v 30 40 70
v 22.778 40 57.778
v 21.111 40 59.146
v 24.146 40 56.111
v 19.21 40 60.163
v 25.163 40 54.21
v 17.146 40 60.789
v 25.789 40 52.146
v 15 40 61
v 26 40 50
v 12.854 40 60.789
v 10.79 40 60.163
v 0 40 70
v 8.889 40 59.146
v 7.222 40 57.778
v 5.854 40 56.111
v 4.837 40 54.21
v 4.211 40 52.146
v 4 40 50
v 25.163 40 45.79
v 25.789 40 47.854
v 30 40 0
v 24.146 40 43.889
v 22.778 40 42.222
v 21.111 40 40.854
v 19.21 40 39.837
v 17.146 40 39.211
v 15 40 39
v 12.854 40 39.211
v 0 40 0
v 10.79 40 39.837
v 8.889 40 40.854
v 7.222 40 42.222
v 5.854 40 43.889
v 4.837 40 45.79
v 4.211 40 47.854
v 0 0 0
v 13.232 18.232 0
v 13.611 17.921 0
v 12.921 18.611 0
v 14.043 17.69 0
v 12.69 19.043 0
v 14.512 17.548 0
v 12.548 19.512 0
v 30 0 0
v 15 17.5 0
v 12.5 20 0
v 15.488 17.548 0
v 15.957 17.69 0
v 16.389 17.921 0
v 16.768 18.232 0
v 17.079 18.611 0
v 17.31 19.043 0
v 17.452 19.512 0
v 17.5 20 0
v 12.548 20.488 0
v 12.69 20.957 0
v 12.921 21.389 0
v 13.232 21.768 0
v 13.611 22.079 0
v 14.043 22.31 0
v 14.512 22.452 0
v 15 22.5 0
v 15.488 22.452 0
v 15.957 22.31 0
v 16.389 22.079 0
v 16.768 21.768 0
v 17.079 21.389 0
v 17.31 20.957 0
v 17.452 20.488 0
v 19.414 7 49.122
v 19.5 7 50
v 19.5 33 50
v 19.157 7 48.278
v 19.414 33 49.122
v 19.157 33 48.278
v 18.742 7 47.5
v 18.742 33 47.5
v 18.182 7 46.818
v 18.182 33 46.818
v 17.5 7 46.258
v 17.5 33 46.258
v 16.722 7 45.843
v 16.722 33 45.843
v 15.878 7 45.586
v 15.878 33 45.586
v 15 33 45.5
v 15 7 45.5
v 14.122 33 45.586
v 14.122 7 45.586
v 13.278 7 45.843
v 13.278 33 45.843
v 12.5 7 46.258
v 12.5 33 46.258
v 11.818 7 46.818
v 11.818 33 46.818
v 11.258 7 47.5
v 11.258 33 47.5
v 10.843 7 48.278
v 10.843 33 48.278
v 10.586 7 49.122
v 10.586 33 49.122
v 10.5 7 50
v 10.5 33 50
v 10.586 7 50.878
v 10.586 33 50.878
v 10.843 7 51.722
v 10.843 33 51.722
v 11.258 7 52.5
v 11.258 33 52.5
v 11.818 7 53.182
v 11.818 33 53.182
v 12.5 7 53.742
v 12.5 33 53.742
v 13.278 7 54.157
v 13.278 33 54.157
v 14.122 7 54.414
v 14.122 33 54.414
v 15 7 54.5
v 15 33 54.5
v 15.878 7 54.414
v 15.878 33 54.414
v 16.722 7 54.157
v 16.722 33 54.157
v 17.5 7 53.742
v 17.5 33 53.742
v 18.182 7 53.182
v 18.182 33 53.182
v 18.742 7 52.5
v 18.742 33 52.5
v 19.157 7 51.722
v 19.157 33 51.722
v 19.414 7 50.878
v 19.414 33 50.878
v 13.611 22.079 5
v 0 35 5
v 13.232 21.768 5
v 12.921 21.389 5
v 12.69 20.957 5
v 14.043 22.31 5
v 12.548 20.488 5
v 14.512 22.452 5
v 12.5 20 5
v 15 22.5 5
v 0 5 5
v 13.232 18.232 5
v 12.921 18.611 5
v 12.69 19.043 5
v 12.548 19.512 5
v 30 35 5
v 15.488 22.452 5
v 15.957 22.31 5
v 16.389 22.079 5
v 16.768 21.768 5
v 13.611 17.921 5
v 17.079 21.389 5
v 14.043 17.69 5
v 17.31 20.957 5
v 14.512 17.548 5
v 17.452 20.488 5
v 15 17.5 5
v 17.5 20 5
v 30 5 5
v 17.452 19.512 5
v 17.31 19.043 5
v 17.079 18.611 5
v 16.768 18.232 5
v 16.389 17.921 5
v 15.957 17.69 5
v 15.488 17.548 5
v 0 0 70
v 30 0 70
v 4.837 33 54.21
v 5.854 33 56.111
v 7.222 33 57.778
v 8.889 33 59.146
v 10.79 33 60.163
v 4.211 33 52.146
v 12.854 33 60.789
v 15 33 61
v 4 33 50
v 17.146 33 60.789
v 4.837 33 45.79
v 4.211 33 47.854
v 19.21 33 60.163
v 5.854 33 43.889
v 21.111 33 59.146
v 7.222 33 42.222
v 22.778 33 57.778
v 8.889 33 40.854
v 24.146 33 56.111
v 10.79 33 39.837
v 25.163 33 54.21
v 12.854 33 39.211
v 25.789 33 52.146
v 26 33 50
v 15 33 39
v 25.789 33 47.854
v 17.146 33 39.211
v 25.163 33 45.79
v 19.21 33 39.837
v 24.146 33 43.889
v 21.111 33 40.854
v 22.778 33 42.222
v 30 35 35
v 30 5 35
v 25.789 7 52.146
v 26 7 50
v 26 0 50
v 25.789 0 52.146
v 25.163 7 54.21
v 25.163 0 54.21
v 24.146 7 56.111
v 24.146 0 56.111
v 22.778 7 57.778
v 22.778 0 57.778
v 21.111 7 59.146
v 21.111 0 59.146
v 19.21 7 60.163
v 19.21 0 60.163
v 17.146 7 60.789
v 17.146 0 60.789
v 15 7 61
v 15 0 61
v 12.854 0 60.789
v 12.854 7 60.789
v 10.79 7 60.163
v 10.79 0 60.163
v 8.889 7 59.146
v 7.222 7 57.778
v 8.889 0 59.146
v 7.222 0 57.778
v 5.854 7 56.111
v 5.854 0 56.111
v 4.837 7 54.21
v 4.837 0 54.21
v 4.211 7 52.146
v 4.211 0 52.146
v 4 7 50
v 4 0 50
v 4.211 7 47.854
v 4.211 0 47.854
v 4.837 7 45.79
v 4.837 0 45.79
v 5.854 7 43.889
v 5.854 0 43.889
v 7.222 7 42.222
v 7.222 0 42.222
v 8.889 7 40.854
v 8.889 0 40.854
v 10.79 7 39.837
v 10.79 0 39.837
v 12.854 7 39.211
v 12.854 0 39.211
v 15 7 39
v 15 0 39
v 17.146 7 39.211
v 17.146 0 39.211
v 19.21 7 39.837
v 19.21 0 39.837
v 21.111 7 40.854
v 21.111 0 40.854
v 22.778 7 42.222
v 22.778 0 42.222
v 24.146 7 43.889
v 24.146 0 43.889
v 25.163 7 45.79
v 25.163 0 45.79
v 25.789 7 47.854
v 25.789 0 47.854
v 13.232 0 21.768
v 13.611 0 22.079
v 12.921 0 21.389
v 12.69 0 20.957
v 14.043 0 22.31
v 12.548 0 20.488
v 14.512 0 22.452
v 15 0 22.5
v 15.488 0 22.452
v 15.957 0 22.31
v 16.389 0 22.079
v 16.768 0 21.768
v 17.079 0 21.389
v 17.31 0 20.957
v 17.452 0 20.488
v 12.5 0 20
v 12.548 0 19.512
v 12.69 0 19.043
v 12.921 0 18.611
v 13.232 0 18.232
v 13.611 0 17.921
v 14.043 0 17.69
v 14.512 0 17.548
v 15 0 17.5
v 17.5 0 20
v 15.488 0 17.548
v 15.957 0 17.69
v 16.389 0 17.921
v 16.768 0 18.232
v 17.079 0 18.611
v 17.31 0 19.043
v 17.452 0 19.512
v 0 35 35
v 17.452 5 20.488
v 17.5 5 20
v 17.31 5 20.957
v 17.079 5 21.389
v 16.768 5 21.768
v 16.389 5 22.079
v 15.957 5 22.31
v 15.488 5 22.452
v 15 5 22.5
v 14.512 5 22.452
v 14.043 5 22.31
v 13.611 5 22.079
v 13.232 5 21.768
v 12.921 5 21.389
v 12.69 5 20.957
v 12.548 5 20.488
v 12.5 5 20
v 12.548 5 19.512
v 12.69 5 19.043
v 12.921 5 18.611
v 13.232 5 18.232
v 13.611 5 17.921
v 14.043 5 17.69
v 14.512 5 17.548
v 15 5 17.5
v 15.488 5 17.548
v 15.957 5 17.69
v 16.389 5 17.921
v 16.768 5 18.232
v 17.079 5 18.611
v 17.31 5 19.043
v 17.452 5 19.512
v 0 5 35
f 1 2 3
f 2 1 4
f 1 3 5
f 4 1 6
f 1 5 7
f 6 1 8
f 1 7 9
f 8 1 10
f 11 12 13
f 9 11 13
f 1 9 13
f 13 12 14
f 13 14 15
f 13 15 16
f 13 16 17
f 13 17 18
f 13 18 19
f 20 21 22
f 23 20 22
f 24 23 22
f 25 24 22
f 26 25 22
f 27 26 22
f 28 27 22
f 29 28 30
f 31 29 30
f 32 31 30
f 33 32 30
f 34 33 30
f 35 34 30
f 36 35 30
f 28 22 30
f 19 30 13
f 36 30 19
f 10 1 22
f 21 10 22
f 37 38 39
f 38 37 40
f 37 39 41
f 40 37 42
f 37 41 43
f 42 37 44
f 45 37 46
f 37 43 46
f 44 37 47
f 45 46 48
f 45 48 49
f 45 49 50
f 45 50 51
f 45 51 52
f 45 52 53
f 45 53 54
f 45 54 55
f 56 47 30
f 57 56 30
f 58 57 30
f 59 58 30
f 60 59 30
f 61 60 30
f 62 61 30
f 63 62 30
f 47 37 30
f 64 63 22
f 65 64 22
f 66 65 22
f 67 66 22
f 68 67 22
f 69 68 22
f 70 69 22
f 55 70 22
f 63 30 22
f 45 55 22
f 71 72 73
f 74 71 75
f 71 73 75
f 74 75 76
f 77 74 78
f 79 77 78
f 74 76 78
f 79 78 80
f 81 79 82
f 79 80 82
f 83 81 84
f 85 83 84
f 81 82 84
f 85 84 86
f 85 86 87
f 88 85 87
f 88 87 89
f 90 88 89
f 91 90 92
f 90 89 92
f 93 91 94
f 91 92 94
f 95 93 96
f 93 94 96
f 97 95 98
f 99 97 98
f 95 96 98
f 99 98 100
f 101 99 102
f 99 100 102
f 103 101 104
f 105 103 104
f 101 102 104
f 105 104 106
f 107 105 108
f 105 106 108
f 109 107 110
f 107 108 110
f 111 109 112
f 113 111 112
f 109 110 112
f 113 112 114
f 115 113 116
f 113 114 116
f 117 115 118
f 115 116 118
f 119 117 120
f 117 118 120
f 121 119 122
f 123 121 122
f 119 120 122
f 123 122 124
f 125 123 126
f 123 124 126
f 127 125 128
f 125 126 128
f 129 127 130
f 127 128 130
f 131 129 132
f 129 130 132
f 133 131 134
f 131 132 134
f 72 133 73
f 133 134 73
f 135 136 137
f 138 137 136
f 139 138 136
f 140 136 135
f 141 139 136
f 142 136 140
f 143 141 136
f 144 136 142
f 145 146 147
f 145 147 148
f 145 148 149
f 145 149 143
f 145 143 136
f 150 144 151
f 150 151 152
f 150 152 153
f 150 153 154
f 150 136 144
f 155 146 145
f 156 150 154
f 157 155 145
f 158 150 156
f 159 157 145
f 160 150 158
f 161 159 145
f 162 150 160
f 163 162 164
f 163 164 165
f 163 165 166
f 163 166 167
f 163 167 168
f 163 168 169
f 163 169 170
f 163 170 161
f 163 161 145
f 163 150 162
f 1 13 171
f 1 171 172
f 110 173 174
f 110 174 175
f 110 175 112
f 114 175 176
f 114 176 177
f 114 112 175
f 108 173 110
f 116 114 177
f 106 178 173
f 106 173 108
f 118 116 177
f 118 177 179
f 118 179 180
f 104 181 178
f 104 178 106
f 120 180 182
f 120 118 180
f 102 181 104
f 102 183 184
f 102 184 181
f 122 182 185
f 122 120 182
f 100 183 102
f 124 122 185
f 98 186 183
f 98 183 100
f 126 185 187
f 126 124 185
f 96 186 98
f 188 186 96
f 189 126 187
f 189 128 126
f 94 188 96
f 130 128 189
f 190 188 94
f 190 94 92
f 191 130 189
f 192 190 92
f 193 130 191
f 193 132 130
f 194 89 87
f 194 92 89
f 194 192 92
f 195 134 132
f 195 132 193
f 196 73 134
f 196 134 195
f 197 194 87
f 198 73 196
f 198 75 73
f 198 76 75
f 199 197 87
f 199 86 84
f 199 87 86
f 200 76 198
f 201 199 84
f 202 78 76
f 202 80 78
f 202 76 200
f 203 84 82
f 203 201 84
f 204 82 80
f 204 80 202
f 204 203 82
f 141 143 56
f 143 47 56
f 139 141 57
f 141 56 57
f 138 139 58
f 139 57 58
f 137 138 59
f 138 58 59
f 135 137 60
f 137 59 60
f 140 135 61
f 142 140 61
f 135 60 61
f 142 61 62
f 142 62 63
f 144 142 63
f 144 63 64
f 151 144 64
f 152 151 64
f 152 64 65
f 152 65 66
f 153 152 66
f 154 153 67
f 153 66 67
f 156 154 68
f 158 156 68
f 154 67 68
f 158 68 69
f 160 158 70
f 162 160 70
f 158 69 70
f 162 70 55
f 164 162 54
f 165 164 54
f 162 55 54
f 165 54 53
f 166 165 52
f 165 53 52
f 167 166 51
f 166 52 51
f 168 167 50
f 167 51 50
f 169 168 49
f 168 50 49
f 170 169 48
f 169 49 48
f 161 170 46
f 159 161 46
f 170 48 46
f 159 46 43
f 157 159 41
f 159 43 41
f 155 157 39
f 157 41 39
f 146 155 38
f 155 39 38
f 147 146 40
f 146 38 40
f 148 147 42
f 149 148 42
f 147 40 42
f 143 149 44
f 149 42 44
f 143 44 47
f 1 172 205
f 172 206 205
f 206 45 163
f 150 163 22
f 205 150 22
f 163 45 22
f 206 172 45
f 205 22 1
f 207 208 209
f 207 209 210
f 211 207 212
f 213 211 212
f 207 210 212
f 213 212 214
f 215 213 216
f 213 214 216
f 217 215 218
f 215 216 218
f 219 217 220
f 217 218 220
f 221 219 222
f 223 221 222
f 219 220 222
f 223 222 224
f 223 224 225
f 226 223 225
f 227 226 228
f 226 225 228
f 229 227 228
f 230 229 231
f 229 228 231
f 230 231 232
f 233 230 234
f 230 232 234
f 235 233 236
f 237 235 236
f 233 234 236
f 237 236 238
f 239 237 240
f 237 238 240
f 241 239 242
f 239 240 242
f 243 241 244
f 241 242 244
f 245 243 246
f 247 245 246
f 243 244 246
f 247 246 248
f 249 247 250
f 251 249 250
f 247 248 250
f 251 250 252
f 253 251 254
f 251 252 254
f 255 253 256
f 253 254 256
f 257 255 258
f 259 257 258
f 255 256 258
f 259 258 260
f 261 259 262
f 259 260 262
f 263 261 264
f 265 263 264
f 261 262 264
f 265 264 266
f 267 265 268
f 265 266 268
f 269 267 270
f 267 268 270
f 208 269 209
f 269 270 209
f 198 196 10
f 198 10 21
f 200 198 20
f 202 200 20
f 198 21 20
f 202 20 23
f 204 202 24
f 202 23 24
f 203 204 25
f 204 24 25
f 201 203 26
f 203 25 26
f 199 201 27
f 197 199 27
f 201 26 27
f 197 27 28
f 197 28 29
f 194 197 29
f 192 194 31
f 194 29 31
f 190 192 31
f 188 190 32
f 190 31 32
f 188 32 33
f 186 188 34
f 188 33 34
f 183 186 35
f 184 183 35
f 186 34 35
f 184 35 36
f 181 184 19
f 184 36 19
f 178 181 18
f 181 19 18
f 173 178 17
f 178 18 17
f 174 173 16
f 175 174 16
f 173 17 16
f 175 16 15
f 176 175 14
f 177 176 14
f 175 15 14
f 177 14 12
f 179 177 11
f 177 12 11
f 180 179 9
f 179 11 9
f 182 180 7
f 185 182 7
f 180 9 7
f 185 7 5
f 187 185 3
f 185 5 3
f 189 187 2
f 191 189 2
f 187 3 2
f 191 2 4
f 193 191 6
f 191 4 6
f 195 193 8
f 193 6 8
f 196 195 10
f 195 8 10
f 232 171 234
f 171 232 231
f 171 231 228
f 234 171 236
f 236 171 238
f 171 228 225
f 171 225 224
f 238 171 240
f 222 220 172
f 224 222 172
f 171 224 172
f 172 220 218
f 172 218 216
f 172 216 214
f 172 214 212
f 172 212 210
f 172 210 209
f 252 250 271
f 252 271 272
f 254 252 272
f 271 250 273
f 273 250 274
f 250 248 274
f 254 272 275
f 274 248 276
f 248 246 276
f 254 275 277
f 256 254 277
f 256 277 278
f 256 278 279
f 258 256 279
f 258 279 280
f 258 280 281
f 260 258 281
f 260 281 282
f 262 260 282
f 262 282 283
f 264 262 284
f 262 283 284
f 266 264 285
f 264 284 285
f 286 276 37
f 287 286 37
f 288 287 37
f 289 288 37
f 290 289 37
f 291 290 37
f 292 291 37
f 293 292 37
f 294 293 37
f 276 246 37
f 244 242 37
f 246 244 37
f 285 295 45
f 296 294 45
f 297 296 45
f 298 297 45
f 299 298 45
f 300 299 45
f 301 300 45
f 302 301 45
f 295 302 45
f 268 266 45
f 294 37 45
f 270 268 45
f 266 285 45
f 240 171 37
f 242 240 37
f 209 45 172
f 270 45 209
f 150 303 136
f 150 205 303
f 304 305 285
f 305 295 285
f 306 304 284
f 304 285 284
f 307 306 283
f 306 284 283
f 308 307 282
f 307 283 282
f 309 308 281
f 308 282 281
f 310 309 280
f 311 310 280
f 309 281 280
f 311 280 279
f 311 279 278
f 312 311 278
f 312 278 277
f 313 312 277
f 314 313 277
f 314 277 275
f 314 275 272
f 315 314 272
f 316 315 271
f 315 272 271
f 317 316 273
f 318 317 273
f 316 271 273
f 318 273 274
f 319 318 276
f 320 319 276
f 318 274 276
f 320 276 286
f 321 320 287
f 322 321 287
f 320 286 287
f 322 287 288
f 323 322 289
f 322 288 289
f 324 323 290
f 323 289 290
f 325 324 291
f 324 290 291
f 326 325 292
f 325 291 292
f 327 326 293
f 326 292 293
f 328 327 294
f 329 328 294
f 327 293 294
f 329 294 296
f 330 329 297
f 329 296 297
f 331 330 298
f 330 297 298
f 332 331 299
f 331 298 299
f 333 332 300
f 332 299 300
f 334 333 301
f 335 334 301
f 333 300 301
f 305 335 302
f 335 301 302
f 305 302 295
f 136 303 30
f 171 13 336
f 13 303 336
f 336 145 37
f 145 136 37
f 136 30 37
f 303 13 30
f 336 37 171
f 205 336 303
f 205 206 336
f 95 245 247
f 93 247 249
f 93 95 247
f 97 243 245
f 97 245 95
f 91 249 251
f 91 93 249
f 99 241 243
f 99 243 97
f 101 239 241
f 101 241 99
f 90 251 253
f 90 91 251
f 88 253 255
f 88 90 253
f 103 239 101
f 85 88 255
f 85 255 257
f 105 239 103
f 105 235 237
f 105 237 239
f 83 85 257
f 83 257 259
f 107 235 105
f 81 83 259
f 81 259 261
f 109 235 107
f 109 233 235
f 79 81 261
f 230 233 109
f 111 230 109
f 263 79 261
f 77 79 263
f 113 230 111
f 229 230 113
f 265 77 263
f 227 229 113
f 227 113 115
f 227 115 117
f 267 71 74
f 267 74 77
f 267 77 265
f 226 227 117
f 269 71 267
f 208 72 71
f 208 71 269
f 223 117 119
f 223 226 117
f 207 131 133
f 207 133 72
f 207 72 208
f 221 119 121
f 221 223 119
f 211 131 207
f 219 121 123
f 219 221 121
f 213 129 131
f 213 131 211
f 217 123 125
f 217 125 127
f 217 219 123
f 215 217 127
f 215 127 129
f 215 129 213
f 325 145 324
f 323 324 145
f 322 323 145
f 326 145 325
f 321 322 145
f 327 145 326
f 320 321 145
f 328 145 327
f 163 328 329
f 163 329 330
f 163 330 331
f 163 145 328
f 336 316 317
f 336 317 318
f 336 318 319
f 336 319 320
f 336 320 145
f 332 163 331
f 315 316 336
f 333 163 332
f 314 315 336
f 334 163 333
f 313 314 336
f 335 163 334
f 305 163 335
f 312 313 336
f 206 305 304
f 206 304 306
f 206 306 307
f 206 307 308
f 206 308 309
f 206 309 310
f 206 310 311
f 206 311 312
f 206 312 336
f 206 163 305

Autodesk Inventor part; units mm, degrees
ref_plane "YZ Plane" through (0, 0, 0) normal (1, 0, 0) x (0, 1, 0)
ref_plane "XZ Plane" through (0, 0, 0) normal (0, 1, 0) x (-1, 0, 0)
ref_plane "XY Plane" through (0, 0, 0) normal (0, 0, 1) x (1, 0, 0)
sketch "Sketch1" plane through (0, 0, 0) normal (0, 0, 1) x (1, 0, 0)
  line L0 (0, 0) -> (30, 0)
  line L1 (30, 0) -> (30, 40)
  line L2 (30, 40) -> (0, 40)
  line L3 (0, 40) -> (0, 0)
  dimension "d0" = 40
  dimension "d1" = 30
extrude "Extrusion1" add sketch "Sketch1" along normal blind 70
sketch "Sketch2" plane through (30, 0, 0) normal (1, 0, 0) x (0, 0, -1)
  line L0 (-5, 5) -> (-35, 5)
  line L1 (-35, 5) -> (-35, 35)
  line L2 (-35, 35) -> (-5, 35)
  line L3 (-5, 35) -> (-5, 5)
  line L4 (0, 0) -> (0, 40) projected
  line L5 (0, 0) -> (-70, 0) projected
  point P0 (-5, 20)
  dimension "d4" = 5
  dimension "d5" = 30
  dimension "d6" = 30
  dimension "d7" = 5
extrude "Extrusion2" cut sketch "Sketch2" against normal blind 70
sketch "Sketch3" plane through (0, 0, 0) normal (0, -1, 0) x (1, 0, 0)
  circle A0 centre (15, 50) radius 11
  line L0 (30, 35) -> (0, 35) projected
  line L1 (30, 0) -> (30, 70) projected
  point P0 (0, 0)
  dimension "d10" = 15
  dimension "d11" = 22
  dimension "d12" = 15
extrude "Extrusion3" cut sketch "Sketch3" against normal blind 7
sketch "Sketch4" plane through (0, 40, 0) normal (0, 1, 0) x (1, 0, 0)
  circle A0 centre (15, -50) radius 11
  line L0 (0, 0) -> (0, -70) projected
  point P0 (30, -35)
  dimension "d15" = 22
  dimension "d16" = 15
  dimension "d17" = 15
extrude "Extrusion4" cut sketch "Sketch4" against normal blind 7
sketch "Sketch5" plane through (15, 33, 50) normal (0, 1, 0) x (1, 0, 0)
  circle A0 centre (0, 0) radius 4.5
  point P0 (-15, 50)
  dimension "d20" = 9
extrude "Extrusion5" cut sketch "Sketch5" against normal blind 30
sketch "Sketch6" plane through (0, 0, 0) normal (0, -1, 0) x (1, 0, 0)
  circle A0 centre (15, 20) radius 2.5
  line L0 (0, 0) -> (0, 70) projected
  point P0 (0, 5)
  dimension "d23" = 5
  dimension "d24" = 15
  dimension "d25" = 15
extrude "Extrusion6" cut sketch "Sketch6" against normal blind 10
sketch "Sketch7" plane through (0, 0, 0) normal (0, 0, -1) x (-1, 0, 0)
  circle A0 centre (-15, 20) radius 2.5
  line L0 (0, 40) -> (0, 0) projected
  point P0 (0, 5)
  dimension "d28" = 5
  dimension "d29" = 15
  dimension "d30" = 15
extrude "Extrusion7" cut sketch "Sketch7" against normal blind 10
properties part number "double_gear_mount"
